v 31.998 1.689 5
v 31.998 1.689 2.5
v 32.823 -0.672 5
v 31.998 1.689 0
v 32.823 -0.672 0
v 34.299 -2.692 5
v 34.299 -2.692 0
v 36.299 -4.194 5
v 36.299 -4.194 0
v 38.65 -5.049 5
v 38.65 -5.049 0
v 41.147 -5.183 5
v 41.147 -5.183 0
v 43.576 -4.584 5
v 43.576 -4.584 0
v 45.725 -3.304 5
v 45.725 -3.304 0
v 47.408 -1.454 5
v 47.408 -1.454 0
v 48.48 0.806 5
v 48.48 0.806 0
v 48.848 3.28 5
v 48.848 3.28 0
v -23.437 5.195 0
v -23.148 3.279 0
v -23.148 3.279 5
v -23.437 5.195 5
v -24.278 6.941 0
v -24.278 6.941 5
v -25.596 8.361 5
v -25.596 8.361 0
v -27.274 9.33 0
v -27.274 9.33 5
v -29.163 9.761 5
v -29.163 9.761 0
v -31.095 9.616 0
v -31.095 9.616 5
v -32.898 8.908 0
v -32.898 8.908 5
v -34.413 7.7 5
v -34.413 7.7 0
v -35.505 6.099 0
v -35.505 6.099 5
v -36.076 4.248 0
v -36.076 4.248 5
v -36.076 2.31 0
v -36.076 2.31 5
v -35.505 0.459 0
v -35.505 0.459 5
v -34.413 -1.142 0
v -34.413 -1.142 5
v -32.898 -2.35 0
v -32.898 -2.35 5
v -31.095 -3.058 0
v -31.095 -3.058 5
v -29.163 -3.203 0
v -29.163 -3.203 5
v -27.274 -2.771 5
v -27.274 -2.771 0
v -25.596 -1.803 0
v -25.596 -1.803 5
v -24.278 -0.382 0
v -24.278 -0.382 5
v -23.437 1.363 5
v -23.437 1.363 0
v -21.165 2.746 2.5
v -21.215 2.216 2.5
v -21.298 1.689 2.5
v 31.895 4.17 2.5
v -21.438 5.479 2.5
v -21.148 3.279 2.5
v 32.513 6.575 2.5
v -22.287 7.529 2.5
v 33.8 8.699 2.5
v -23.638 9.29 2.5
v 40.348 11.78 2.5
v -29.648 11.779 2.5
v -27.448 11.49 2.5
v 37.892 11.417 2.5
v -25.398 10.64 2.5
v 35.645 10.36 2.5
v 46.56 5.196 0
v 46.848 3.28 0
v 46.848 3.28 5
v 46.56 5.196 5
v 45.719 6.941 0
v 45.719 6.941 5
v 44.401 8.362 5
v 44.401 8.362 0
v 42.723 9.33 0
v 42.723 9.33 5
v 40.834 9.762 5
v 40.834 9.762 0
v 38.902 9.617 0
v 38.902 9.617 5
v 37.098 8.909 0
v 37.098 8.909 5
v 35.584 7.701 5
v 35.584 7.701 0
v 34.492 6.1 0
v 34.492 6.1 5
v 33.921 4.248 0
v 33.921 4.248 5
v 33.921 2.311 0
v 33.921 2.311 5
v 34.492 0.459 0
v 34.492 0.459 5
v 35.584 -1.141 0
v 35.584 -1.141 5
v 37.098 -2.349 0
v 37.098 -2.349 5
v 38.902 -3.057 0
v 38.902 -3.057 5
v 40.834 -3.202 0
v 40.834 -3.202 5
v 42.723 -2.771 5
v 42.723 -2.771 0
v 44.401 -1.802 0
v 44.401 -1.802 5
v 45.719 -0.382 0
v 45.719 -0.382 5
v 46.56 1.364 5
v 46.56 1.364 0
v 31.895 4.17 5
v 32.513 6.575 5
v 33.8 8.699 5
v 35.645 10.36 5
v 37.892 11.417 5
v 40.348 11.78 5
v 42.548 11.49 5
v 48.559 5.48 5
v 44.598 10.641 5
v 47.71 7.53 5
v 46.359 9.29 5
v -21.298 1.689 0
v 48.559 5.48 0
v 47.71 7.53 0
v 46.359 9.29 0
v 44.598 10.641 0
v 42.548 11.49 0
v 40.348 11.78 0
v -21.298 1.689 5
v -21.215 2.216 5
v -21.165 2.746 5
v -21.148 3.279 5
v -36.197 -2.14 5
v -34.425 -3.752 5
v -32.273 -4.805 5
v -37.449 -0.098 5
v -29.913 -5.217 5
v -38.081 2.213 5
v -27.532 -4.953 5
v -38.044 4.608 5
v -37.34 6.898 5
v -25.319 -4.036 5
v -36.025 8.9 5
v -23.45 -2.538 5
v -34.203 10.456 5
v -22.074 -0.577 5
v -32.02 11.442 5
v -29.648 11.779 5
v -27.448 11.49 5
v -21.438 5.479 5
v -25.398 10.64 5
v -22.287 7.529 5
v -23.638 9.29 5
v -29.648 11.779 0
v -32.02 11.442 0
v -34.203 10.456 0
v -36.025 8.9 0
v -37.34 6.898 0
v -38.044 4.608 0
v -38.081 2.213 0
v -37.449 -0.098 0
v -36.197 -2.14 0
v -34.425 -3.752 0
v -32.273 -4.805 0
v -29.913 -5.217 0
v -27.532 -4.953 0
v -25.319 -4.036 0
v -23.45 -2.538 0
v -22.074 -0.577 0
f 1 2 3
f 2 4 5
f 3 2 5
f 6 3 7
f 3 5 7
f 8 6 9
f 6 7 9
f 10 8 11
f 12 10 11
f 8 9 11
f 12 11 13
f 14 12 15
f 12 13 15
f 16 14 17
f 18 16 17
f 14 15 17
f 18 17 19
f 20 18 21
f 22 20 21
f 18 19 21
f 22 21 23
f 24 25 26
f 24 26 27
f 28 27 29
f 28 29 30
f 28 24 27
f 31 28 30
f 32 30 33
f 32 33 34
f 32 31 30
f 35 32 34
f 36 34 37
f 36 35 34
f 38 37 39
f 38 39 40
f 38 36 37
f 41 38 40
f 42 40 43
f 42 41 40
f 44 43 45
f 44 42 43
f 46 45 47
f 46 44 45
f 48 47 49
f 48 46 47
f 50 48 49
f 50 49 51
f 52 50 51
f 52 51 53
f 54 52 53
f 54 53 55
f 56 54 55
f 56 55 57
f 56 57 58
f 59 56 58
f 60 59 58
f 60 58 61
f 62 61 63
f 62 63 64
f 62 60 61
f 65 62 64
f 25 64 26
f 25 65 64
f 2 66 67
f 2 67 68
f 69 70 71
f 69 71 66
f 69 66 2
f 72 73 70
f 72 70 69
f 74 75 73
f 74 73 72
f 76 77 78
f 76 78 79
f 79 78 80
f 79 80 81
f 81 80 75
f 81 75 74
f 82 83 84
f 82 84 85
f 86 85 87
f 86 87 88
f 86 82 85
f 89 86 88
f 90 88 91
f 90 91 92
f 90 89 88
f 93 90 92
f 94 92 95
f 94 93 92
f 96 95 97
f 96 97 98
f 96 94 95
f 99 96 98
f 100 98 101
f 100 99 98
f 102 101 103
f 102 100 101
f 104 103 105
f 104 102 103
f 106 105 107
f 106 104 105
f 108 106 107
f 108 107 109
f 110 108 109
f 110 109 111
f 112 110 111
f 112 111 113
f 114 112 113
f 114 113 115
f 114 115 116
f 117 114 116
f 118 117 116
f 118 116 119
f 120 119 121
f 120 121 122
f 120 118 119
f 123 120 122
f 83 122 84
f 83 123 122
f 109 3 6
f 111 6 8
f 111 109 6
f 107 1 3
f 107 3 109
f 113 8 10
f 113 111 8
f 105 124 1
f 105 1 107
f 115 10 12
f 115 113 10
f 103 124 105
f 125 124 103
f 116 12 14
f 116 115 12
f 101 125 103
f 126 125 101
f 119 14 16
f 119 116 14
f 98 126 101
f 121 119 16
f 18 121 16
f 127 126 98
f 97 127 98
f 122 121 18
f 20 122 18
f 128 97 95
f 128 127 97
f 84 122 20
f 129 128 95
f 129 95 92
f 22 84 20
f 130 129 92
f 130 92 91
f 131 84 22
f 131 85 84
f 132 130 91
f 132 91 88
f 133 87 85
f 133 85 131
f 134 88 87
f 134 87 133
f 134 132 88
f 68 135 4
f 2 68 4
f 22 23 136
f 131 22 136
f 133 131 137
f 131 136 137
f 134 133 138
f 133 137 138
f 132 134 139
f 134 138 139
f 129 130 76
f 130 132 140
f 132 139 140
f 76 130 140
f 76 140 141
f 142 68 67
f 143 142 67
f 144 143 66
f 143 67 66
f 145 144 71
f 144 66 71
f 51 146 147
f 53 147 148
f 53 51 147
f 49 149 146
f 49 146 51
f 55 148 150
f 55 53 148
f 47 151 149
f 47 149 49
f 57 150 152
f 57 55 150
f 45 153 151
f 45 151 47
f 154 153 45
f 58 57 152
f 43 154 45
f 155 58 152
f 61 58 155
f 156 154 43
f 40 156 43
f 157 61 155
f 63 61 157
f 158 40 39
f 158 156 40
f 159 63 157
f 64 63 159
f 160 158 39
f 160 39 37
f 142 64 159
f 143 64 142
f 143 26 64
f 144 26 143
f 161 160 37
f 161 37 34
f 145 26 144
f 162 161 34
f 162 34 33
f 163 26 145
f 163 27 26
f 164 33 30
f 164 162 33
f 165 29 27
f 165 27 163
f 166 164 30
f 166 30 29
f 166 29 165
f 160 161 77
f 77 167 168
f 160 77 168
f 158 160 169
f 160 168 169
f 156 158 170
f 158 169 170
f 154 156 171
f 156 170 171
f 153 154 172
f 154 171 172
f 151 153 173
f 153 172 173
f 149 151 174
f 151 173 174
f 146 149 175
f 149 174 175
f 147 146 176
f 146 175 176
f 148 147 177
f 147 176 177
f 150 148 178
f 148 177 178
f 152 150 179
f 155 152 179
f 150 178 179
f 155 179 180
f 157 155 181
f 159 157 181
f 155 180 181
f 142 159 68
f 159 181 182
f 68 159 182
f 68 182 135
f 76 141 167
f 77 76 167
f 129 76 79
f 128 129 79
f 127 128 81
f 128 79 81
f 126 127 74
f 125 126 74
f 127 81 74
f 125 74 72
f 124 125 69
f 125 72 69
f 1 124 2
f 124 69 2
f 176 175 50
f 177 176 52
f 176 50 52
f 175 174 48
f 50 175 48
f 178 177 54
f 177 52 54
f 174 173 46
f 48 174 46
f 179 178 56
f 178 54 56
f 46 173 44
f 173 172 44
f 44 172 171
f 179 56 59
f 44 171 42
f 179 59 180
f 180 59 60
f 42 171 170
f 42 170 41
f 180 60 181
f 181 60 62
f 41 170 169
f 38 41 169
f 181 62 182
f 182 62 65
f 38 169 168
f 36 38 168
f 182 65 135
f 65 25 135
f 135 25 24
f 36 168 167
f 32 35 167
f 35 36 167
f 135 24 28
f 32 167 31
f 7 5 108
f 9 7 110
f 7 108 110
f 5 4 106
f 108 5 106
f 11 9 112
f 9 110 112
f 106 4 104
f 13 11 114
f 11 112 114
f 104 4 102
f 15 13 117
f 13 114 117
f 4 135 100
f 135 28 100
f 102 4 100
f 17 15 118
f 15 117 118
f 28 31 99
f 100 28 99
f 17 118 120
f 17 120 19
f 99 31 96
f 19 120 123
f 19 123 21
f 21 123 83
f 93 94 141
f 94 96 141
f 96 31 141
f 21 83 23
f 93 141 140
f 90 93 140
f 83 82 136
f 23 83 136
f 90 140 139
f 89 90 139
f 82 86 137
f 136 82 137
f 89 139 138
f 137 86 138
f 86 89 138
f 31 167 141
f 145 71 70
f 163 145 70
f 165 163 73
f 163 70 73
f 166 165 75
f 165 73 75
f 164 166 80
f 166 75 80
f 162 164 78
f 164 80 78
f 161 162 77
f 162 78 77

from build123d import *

# Parameters (mm, degrees)
F1_DEPTH = 2.5
F0_R     = 6.5
F2_DEPTH = 5


with BuildPart() as f1:
    # F0 (on Top) → F1 (new body)
    with BuildSketch(Plane.XY):
        with BuildLine():
            ThreePointArc((-29.64832, 11.779182), (-23.637873, 9.289611), (-21.148259, 3.279182))
            ThreePointArc((-21.148259, 3.279182), (-21.185854, 2.480628), (-21.298304, 1.689138))
            Line((-21.298304, 1.689138), (31.998499, 1.689138))
            ThreePointArc((31.998499, 1.689138), (33.799692, 8.698623), (40.3483, 11.77968))
            Line((40.3483, 11.77968), (-29.64832, 11.779182))
        make_face()
    extrude(amount=F1_DEPTH)

    # F0 (on Top) → F2 (join)
    with BuildSketch(Plane.XY):
        with BuildLine():
            ThreePointArc((-21.298304, 1.689138), (-21.185854, 2.480628), (-21.148259, 3.279182))
            ThreePointArc((-21.148259, 3.279182), (-23.637873, 9.289611), (-29.64832, 11.779182))
            ThreePointArc((-29.64832, 11.779182), (-36.196728, -2.140003), (-21.298304, 1.689138))
        make_face()
        with Locations((-29.648259, 3.279182)):
            Circle(F0_R, mode=Mode.SUBTRACT)
        with BuildLine():
            ThreePointArc((48.84836, 3.27968), (46.358747, 9.290109), (40.3483, 11.77968))
            ThreePointArc((40.3483, 11.77968), (33.799692, 8.698623), (31.998499, 1.689138))
            ThreePointArc((31.998499, 1.689138), (41.147167, -5.182702), (48.84836, 3.27968))
        make_face()
        with Locations((40.34836, 3.27968)):
            Circle(F0_R, mode=Mode.SUBTRACT)
    extrude(amount=F2_DEPTH)


solid = f1.part
